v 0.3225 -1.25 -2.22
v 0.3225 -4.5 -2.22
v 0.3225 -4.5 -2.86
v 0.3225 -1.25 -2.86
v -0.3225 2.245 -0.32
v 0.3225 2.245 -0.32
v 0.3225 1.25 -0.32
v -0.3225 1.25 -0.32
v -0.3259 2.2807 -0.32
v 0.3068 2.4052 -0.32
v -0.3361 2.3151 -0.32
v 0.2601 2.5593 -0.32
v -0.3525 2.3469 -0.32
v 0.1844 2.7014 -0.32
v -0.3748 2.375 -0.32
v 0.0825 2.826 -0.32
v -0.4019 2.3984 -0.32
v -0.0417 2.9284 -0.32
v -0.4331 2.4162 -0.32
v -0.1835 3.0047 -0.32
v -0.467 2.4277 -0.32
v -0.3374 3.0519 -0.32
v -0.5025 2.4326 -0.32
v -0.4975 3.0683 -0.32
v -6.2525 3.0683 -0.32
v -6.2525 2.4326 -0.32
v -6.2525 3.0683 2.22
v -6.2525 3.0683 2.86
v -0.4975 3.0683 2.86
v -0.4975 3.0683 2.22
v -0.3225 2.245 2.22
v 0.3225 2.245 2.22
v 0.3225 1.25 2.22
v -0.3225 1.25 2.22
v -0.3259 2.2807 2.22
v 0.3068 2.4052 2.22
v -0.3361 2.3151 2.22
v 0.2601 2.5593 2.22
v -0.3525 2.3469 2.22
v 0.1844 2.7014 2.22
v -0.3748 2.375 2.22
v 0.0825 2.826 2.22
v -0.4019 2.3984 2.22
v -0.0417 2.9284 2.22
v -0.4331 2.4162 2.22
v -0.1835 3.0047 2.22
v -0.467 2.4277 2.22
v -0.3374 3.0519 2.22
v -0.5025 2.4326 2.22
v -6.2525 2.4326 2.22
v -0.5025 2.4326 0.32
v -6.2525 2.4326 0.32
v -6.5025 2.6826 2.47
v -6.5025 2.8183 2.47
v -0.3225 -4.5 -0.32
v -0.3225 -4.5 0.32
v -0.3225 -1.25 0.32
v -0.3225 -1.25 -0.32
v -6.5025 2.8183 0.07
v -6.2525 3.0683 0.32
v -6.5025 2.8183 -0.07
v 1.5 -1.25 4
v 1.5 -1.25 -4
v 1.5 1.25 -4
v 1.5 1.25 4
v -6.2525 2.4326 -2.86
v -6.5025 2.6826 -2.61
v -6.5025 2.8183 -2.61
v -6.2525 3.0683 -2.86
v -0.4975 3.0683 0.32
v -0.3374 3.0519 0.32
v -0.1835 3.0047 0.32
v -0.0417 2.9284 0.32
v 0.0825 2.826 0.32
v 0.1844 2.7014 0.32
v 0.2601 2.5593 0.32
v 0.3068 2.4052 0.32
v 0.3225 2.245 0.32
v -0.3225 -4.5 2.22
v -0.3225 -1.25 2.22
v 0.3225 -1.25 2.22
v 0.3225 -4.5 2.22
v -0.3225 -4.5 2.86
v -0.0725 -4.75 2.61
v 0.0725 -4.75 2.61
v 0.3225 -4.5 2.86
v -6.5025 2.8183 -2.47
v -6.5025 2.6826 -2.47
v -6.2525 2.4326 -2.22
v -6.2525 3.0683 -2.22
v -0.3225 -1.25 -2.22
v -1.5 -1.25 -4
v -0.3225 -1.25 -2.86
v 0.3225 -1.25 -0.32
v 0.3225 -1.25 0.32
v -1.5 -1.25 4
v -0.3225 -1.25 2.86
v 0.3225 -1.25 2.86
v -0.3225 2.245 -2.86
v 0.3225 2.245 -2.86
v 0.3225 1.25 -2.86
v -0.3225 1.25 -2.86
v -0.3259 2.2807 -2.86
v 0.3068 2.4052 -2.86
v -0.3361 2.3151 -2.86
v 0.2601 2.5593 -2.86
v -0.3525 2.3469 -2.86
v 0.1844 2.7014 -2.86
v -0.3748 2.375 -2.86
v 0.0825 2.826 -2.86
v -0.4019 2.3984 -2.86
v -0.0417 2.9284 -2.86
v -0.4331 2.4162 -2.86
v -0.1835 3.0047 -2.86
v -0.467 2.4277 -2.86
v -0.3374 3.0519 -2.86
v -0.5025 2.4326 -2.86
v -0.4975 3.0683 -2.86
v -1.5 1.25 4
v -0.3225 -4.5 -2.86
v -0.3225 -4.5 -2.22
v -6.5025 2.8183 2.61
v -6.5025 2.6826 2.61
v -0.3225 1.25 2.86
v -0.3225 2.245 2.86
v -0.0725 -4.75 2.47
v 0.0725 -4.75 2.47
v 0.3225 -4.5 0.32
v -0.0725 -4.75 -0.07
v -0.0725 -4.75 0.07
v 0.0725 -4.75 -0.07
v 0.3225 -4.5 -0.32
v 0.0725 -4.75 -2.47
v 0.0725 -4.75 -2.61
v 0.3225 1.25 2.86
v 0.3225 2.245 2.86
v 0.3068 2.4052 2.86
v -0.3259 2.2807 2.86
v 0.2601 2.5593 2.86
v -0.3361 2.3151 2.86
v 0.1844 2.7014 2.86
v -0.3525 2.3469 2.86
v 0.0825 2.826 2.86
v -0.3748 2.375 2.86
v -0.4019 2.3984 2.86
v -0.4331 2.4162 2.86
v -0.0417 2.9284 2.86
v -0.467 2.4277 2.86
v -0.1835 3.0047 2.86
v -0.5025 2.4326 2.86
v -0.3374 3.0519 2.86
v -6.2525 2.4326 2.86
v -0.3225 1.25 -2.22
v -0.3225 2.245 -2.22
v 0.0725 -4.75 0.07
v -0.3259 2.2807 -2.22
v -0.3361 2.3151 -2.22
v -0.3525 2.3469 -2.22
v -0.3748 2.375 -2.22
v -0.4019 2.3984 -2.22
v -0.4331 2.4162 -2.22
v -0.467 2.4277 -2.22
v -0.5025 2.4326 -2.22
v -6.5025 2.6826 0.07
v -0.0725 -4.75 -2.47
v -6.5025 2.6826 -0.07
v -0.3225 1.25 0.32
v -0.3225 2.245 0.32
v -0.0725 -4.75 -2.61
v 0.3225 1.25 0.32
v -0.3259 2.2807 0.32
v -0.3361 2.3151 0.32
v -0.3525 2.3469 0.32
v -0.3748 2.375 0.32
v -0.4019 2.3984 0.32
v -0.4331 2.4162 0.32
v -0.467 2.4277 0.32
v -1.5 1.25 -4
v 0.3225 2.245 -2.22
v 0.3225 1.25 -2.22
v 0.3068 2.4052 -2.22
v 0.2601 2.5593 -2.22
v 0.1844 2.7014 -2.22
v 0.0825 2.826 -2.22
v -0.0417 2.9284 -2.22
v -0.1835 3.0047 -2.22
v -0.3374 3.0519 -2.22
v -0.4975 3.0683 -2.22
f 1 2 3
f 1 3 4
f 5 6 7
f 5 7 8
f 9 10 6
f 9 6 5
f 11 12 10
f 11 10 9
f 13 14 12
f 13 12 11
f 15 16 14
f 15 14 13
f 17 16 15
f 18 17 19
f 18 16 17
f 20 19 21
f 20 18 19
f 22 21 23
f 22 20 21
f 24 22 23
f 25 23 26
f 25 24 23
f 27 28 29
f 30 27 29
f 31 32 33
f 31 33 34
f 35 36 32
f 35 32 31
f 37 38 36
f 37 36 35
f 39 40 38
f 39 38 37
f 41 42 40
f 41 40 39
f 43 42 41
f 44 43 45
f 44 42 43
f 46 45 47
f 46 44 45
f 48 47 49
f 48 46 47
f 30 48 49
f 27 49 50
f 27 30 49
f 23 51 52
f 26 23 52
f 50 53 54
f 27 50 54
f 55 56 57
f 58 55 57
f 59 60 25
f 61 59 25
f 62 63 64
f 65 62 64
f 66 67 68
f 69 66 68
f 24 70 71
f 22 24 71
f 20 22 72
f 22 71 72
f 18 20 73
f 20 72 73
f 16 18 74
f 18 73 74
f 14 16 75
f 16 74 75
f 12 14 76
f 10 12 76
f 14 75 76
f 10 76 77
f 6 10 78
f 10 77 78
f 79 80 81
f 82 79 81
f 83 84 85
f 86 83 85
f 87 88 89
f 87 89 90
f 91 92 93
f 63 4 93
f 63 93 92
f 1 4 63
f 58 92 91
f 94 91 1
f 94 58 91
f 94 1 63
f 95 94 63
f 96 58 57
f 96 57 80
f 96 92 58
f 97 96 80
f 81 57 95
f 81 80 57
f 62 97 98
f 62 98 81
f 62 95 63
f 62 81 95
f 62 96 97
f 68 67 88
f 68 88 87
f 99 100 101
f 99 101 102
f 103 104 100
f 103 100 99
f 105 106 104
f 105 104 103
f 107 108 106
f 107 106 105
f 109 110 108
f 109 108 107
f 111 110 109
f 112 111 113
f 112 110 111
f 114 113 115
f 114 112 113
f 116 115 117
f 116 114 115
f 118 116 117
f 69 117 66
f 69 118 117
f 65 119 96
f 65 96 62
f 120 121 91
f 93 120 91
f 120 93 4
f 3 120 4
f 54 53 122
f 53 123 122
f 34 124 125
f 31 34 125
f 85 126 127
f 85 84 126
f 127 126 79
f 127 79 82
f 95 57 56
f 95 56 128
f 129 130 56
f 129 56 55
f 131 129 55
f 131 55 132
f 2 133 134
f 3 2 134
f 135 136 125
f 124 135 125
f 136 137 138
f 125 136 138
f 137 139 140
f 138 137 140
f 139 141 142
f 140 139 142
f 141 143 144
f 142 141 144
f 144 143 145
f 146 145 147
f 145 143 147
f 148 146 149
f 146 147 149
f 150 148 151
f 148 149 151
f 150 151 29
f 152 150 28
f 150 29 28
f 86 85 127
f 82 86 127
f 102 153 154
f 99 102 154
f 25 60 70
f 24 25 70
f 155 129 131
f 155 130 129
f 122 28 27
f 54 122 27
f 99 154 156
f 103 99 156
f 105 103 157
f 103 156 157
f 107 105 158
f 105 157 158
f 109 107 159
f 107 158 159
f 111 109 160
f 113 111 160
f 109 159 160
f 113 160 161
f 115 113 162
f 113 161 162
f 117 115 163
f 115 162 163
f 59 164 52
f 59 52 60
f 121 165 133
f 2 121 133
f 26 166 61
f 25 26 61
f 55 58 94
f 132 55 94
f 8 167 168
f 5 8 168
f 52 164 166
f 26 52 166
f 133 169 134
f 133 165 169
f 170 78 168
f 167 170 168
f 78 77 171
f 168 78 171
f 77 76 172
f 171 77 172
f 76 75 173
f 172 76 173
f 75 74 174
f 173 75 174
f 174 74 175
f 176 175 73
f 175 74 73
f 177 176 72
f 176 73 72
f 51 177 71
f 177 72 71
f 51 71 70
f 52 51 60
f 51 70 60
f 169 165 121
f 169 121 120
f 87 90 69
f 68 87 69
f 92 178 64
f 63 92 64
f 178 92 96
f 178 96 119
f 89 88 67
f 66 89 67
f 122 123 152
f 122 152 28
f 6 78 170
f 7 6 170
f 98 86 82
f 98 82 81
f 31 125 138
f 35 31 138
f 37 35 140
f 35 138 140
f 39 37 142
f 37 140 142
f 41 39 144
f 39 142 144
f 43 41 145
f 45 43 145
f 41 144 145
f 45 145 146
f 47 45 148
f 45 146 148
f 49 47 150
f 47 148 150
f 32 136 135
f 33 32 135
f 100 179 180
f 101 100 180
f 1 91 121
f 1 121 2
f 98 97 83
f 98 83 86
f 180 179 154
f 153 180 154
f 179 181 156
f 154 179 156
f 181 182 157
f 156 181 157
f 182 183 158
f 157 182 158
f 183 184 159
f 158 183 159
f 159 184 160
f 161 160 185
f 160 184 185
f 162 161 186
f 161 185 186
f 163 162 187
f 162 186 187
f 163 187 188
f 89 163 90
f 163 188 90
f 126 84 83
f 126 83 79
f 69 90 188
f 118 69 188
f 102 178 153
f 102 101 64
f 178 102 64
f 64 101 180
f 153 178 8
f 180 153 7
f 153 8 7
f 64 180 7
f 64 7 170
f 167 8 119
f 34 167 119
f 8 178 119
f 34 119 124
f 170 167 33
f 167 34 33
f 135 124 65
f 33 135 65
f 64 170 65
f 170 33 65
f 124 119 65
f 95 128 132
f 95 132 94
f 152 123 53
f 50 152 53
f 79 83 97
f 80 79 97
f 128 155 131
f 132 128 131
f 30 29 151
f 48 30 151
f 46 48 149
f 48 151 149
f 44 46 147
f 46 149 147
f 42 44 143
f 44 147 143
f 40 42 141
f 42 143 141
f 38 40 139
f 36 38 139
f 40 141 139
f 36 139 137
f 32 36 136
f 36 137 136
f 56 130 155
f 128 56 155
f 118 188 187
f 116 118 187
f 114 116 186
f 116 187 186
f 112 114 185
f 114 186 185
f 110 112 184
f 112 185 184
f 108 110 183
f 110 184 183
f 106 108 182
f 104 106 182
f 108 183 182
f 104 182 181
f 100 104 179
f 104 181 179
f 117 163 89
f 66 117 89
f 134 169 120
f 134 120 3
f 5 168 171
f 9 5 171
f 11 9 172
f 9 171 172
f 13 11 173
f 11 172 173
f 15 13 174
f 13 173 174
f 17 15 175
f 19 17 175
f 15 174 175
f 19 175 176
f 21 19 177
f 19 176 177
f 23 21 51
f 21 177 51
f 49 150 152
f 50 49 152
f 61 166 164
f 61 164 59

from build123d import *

# Parameters (mm, degrees)
SKETCH1_W       = 3
SKETCH1_H       = 2.5
EXTRUDE1_DEPTH  = 4
SKETCH2_W       = 0.645
SKETCH2_H       = 3.5
EXTRUDE2_DEPTH  = 0.64
LPATTERN1_COUNT = 3
LPATTERN1_PITCH = 2.54
CHAMFER1_SIZE   = 0.25


with BuildPart() as part:
    # Sketch1 → Extrude1 (new body, symmetric)
    with BuildSketch(Plane.XY):
        Rectangle(SKETCH1_W, SKETCH1_H)
    extrude(amount=EXTRUDE1_DEPTH, both=True)

    # Sketch2 → Extrude2 (add)
    with BuildSketch(Plane.XY.offset(2.86)):
        with BuildLine():
            Line((-0.3225, 1.25), (-0.3225, 2.245))
            ThreePointArc((-0.3225, 2.245), (-0.374776878, 2.375), (-0.5025, 2.43261663))
            Line((-0.5025, 2.43261663), (-6.5025, 2.43261663))
            Line((-6.5025, 2.43261663), (-6.5025, 3.06831282))
            Line((-6.5025, 3.06831282), (-0.4975, 3.06831282))
            ThreePointArc((-0.4975, 3.06831282), (0.082527742, 2.826), (0.3225, 2.245))
            Line((0.3225, 2.245), (0.3225, 1.25))
            Line((0.3225, 1.25), (-0.3225, 1.25))
        make_face()
        with Locations((0, -3)):
            Rectangle(SKETCH2_W, SKETCH2_H)
    extrude2 = extrude(amount=-EXTRUDE2_DEPTH)

    # LPattern1: Extrude2 ×3
    with Locations(*[(0, 0, -i * LPATTERN1_PITCH) for i in range(1, LPATTERN1_COUNT)]):
        add(extrude2)

    # Chamfer1
    chamfer1_edges = [part.edges().sort_by_distance(p)[0] for p in [
        (-6.5025, 2.750464725, 2.22),
        (-6.5025, 2.43261663, 2.54),
        (-6.5025, 3.06831282, 2.54),
        (-6.5025, 2.750464725, 2.86),
        (0, -4.75, 2.22),
        (0.3225, -4.75, 2.54),
        (-0.3225, -4.75, 2.54),
        (0, -4.75, 2.86),
        (-6.5025, 2.750464725, -0.32),
        (-6.5025, 2.43261663, 0),
        (-6.5025, 3.06831282, 0),
        (-6.5025, 2.750464725, 0.32),
        (0, -4.75, -0.32),
        (0.3225, -4.75, 0),
        (-0.3225, -4.75, 0),
        (0, -4.75, 0.32),
        (-6.5025, 2.750464725, -2.86),
        (-6.5025, 2.43261663, -2.54),
        (-6.5025, 3.06831282, -2.54),
        (-6.5025, 2.750464725, -2.22),
        (0, -4.75, -2.86),
        (0.3225, -4.75, -2.54),
        (-0.3225, -4.75, -2.54),
        (0, -4.75, -2.22),
    ]]
    chamfer(chamfer1_edges, length=CHAMFER1_SIZE)


solid = part.part
